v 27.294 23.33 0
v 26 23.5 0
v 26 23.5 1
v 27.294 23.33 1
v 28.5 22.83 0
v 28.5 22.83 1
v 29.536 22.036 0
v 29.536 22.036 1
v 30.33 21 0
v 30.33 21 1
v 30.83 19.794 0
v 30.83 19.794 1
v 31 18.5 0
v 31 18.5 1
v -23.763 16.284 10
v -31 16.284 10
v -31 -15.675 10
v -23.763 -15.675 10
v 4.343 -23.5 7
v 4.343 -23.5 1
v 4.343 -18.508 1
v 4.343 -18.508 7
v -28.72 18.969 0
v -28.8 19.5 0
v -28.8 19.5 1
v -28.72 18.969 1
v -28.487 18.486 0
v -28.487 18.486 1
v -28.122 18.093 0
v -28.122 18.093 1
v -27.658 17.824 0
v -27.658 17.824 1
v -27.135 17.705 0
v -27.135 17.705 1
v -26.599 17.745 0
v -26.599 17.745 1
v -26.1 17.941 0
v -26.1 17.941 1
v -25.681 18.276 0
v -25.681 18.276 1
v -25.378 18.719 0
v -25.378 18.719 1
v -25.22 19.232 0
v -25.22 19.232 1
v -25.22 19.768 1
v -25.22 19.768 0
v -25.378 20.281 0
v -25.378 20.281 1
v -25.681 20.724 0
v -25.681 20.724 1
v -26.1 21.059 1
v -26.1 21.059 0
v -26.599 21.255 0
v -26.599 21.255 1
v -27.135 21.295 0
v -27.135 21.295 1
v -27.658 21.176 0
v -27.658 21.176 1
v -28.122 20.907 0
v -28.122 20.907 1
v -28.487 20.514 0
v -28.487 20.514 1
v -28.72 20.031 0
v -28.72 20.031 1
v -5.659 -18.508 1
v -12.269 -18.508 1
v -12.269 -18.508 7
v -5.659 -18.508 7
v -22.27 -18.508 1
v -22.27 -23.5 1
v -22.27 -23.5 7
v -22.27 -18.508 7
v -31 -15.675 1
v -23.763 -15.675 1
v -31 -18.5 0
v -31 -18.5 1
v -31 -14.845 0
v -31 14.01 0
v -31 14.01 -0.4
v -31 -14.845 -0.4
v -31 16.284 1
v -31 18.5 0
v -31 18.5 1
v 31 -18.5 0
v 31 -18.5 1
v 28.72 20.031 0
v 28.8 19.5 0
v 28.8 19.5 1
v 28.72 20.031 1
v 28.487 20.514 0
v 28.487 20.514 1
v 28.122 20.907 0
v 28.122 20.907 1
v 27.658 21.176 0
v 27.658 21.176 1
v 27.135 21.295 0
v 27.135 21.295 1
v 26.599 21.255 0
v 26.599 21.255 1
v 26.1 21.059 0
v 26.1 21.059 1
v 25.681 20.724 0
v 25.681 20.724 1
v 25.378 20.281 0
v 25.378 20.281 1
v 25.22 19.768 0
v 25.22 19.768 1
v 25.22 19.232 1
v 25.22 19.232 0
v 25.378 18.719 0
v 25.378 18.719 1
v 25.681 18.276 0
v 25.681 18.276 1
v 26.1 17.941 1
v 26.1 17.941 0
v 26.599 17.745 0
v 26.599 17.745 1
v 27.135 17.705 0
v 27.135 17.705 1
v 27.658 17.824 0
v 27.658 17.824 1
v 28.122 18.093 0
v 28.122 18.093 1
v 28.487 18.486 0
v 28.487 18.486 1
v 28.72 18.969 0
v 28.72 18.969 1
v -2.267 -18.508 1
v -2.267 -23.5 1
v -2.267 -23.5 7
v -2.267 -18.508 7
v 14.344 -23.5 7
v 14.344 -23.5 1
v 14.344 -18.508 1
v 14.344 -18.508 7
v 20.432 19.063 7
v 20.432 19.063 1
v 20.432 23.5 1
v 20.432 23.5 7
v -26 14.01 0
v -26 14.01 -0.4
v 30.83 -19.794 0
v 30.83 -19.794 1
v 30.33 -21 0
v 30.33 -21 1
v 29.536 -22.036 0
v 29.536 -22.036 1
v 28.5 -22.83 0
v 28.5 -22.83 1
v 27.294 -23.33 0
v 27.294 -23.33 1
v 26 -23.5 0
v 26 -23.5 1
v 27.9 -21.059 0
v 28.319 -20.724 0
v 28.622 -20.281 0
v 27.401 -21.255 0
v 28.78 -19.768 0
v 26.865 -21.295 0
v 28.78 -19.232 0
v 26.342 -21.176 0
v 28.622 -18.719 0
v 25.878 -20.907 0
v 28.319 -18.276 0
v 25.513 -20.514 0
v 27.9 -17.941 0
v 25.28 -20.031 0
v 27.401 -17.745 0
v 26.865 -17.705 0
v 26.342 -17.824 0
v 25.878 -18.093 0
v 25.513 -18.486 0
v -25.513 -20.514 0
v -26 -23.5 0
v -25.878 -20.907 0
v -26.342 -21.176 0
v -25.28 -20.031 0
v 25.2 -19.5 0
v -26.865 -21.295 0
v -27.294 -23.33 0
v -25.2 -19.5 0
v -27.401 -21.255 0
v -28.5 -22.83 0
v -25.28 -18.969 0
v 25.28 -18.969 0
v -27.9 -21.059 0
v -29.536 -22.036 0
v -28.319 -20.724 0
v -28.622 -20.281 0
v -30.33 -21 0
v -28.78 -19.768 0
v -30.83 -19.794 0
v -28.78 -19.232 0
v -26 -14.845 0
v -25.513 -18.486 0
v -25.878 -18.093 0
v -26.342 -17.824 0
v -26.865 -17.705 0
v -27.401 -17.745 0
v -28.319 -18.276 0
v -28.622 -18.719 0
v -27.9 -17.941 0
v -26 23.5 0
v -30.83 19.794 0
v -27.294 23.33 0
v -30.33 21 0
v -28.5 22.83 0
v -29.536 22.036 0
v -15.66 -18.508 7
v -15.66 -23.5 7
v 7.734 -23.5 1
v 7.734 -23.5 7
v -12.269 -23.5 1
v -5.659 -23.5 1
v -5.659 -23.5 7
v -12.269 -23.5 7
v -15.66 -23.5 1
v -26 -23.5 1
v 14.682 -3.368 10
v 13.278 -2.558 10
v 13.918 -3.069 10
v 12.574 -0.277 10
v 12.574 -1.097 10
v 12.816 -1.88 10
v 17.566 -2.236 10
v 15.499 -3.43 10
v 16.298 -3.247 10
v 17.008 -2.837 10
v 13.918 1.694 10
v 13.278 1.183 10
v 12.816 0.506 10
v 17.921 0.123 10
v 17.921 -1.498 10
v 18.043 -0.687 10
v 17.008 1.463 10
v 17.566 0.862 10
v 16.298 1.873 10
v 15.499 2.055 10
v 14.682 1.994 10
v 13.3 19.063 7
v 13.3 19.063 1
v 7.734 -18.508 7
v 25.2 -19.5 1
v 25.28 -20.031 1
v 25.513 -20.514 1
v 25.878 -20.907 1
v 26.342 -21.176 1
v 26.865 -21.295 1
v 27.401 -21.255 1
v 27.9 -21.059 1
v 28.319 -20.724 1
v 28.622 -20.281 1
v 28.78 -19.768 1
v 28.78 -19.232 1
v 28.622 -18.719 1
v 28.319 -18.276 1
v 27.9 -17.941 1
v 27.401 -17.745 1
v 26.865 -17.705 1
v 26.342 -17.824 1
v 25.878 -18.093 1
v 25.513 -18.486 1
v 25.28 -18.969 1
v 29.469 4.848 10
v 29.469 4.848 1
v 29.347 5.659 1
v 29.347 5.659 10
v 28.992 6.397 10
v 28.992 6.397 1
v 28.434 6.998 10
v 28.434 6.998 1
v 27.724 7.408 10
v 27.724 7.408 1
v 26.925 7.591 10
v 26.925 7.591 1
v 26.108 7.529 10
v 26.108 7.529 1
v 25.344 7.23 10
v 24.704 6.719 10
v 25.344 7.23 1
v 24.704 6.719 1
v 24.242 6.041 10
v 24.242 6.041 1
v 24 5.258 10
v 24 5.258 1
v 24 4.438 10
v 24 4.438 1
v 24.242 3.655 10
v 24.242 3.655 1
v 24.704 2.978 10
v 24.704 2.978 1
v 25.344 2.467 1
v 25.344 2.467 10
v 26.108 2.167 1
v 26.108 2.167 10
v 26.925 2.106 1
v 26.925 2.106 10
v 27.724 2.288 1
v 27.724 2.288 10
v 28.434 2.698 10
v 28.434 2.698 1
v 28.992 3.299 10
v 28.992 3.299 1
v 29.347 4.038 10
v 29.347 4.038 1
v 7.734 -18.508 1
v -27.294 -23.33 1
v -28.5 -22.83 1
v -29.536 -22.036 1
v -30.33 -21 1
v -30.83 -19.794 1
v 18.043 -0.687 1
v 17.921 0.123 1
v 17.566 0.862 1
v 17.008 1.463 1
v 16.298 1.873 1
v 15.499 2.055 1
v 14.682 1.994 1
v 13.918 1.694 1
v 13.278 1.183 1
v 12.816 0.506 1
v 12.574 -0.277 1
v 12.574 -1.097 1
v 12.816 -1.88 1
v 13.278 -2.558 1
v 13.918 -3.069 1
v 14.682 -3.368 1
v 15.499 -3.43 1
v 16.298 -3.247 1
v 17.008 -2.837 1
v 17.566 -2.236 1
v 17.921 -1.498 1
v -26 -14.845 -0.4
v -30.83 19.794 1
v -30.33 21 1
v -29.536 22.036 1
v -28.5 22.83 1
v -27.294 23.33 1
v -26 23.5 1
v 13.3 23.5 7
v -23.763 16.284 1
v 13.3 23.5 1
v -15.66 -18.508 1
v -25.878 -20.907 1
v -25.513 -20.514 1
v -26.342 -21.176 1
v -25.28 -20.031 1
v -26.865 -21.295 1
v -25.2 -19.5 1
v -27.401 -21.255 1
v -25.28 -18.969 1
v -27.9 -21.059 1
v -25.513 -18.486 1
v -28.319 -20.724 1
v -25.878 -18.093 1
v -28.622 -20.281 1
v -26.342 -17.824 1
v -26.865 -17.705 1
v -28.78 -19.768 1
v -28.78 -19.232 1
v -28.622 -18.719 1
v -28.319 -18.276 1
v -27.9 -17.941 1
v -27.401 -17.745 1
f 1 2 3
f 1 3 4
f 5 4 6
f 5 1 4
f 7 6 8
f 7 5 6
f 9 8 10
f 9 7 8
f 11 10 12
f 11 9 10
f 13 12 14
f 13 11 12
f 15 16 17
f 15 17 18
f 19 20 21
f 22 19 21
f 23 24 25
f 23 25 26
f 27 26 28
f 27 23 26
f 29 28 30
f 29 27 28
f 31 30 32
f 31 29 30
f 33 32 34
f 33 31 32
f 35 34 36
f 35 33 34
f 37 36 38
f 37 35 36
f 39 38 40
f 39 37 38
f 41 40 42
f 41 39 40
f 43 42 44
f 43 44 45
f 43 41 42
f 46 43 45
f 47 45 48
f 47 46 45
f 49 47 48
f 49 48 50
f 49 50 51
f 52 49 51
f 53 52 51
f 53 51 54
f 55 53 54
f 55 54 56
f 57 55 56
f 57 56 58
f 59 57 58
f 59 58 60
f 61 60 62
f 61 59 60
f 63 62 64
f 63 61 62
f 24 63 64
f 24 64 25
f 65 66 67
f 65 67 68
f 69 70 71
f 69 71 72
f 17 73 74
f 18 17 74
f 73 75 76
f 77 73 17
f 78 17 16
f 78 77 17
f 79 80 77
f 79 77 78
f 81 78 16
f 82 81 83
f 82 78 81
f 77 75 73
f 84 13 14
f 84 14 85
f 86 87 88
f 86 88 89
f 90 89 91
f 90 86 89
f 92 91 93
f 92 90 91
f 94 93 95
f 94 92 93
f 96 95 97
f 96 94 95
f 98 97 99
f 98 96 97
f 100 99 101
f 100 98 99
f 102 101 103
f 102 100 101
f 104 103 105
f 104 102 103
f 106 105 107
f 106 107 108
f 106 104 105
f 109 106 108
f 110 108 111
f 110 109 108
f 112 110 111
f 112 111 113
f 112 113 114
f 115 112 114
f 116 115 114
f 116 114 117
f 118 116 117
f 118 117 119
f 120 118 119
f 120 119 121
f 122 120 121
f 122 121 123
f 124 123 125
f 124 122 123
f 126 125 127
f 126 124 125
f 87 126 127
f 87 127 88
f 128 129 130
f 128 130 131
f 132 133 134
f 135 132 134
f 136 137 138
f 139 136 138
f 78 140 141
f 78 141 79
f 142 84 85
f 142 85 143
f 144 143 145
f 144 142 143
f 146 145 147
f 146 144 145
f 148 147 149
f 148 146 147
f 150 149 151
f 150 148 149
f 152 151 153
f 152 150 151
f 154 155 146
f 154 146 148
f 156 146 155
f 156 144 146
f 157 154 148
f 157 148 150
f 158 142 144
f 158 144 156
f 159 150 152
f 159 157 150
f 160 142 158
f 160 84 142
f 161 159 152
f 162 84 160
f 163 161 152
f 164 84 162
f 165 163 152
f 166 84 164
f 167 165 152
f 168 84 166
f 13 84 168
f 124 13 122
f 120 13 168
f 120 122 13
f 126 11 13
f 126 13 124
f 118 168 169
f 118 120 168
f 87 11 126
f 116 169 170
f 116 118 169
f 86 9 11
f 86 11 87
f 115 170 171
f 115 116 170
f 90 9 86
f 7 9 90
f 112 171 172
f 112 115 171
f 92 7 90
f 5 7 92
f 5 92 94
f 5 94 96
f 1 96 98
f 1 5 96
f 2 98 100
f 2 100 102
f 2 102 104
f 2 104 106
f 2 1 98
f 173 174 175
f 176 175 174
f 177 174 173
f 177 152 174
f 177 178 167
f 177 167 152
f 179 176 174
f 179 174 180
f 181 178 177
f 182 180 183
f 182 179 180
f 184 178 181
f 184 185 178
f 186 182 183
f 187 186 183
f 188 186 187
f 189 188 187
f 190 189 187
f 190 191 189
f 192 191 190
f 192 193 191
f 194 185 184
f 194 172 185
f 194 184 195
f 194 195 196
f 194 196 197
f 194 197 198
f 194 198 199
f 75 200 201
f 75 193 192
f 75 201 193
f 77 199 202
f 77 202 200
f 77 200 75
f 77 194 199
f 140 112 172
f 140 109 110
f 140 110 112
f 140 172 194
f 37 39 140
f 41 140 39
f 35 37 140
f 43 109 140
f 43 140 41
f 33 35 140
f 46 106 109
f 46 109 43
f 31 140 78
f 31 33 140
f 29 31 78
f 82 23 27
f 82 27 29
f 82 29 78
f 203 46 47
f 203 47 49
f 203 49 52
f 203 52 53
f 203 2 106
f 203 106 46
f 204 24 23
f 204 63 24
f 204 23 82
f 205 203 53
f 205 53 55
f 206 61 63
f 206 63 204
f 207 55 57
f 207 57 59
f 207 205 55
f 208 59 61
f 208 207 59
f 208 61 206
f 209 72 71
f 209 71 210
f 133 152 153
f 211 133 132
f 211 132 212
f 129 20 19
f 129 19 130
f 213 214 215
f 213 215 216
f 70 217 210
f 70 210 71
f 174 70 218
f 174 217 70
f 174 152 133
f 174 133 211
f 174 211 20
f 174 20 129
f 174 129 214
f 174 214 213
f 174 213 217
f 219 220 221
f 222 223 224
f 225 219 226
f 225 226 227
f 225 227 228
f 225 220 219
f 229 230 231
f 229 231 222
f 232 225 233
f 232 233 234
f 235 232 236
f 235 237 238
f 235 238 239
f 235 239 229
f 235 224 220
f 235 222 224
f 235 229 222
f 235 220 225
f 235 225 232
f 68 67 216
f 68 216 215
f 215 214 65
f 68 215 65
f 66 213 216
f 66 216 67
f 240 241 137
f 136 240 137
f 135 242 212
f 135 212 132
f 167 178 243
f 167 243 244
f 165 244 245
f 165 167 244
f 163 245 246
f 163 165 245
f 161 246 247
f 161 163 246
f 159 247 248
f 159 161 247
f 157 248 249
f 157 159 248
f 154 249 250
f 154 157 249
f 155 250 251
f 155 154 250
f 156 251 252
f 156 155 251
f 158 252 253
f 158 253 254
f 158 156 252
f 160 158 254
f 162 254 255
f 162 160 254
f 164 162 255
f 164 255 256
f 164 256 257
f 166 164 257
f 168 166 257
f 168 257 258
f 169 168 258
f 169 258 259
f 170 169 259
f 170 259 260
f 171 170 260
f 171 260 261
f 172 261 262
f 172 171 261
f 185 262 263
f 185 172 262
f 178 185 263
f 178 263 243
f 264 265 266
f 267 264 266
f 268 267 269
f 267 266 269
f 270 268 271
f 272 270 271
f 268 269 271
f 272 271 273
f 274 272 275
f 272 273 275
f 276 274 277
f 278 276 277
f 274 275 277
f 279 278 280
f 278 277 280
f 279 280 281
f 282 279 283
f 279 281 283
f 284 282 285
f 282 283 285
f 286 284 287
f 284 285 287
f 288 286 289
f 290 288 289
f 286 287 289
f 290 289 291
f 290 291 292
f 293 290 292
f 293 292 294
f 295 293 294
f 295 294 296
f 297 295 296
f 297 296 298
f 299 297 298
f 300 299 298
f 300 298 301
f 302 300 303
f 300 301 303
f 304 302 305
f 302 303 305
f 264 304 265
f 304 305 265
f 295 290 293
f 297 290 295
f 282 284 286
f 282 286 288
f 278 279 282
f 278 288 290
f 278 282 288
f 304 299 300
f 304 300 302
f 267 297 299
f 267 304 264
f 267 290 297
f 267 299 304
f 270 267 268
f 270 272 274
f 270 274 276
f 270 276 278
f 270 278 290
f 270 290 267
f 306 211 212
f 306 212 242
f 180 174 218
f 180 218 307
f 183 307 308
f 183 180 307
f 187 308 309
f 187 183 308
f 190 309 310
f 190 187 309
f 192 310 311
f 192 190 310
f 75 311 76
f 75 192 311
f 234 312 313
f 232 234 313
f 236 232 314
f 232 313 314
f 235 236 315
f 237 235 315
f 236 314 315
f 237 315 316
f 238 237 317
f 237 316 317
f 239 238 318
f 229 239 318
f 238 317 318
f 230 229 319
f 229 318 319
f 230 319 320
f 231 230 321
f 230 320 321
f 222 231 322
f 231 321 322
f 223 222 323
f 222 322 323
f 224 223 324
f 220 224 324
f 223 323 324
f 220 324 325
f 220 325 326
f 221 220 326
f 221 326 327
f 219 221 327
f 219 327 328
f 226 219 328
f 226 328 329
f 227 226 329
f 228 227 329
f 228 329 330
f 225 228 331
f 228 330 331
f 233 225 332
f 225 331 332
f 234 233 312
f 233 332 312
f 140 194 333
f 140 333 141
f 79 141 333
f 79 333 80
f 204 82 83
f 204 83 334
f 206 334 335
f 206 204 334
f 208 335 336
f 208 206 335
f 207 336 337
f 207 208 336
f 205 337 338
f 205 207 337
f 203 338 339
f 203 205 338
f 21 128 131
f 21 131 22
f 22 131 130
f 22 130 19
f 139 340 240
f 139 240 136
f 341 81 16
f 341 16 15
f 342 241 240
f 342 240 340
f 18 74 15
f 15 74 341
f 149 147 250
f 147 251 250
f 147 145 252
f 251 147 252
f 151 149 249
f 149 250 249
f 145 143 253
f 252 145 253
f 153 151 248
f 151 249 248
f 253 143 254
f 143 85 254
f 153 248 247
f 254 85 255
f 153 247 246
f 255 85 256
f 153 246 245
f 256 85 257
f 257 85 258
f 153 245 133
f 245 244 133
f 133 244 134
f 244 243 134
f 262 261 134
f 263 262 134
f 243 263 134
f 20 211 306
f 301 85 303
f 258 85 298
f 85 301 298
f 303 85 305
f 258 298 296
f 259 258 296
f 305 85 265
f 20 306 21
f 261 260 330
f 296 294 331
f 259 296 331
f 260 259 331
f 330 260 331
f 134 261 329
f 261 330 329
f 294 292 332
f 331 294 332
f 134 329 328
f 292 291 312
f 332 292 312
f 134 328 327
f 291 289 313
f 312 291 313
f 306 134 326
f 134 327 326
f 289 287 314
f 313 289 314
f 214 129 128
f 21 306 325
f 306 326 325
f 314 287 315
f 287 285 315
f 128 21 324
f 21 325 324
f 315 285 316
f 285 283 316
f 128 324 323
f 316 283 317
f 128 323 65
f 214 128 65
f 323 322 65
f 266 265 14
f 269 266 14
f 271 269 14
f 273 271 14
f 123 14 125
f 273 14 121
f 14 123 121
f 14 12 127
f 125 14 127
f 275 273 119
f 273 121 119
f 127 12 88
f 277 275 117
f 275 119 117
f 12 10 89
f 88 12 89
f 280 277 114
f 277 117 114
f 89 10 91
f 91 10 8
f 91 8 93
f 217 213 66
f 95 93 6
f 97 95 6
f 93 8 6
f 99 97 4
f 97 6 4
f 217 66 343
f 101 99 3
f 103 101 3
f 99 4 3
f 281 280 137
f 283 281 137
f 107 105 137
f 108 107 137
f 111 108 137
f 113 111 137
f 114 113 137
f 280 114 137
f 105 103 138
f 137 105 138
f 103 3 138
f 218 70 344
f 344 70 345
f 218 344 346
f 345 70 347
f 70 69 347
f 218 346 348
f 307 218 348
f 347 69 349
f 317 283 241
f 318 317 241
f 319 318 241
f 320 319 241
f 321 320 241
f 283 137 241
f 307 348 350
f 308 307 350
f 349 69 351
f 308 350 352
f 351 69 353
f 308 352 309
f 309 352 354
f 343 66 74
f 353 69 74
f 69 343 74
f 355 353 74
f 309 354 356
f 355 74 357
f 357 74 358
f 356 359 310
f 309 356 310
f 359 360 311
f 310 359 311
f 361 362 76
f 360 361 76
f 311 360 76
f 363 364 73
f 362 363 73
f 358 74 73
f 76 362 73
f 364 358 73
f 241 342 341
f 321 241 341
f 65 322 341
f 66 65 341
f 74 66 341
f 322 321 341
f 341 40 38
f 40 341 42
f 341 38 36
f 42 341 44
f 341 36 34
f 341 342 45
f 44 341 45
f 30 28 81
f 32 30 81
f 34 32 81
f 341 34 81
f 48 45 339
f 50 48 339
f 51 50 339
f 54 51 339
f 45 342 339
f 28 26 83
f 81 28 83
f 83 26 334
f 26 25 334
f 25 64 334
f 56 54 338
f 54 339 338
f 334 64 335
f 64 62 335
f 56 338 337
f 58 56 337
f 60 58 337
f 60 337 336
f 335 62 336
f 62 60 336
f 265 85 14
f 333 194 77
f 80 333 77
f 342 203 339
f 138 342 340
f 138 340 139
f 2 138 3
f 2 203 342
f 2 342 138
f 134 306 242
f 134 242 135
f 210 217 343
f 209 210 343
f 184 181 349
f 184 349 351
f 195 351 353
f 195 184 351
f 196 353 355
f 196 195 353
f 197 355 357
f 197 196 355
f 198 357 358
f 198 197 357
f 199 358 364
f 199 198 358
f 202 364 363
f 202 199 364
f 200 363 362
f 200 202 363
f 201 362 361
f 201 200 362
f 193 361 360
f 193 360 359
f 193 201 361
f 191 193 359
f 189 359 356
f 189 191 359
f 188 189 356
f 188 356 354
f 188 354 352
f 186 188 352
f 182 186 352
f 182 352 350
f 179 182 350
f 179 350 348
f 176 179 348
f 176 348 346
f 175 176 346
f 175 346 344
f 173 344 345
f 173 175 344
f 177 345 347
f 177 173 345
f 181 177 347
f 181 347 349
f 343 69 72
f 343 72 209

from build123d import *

# Parameters (mm, degrees)
SKETCH_2_R      = 1.8
EXTRUDE_1_DEPTH = 1
SKETCH_4_W      = 7.237291628
SKETCH_4_H      = 31.958994792
EXTRUDE_2_DEPTH = 9
SKETCH_5_W      = 6.609648953
SKETCH_5_H      = 4.992409467
SKETCH_5_W_2    = 7.131463344
SKETCH_5_H_2    = 4.436954379
EXTRUDE_3_DEPTH = 6
SKETCH_6_R      = 2.75
EXTRUDE_4_DEPTH = 9
SKETCH_7_W      = 5
SKETCH_7_H      = 28.854406725
EXTRUDE_5_DEPTH = 0.4


with BuildPart() as part:
    # 草图2 → 凸台-拉伸1 (new body)
    with BuildSketch(Plane.XY):
        with BuildLine():
            Line((-26, 23.5), (26, 23.5))
            ThreePointArc((26, 23.5), (29.535533906, 22.035533906), (31, 18.5))
            Line((31, 18.5), (31, -18.5))
            ThreePointArc((31, -18.5), (29.535533906, -22.035533906), (26, -23.5))
            Line((26, -23.5), (-26, -23.5))
            ThreePointArc((-26, -23.5), (-29.535533906, -22.035533906), (-31, -18.5))
            Line((-31, -18.5), (-31, 18.5))
            ThreePointArc((-31, 18.5), (-29.535533906, 22.035533906), (-26, 23.5))
        make_face()
        with Locations((27, 19.5)):
            Circle(SKETCH_2_R, mode=Mode.SUBTRACT)
        with Locations(Location((-27, 19.5, 0), (0, 0, 180))):
            Circle(SKETCH_2_R, mode=Mode.SUBTRACT)
        with Locations(Location((27, -19.5, 0), (0, 0, 180))):
            Circle(SKETCH_2_R, mode=Mode.SUBTRACT)
        with Locations((-27, -19.5)):
            Circle(SKETCH_2_R, mode=Mode.SUBTRACT)
    extrude(amount=EXTRUDE_1_DEPTH)

    # 草图4 → 凸台-拉伸2 (add)
    with BuildSketch(Plane.XY.offset(1)):
        with Locations((-27.381354186, 0.304371379)):
            Rectangle(SKETCH_4_W, SKETCH_4_H)
    extrude(amount=EXTRUDE_2_DEPTH)

    # 草图5 → 凸台-拉伸3 (add)
    with BuildSketch(Plane.XY.offset(1)):
        with Locations((-18.965120236, -21.003795266)):
            Rectangle(SKETCH_5_W, SKETCH_5_H)
        with Locations((-8.96367774, -21.003795266)):
            Rectangle(SKETCH_5_W, SKETCH_5_H)
        with Locations((1.037764754, -21.003795266)):
            Rectangle(SKETCH_5_W, SKETCH_5_H)
        with Locations((11.039207249, -21.003795266)):
            Rectangle(SKETCH_5_W, SKETCH_5_H)
        with Locations((16.866134615, 21.281522811)):
            Rectangle(SKETCH_5_W_2, SKETCH_5_H_2)
    extrude(amount=EXTRUDE_3_DEPTH)

    # 草图6 → 凸台-拉伸4 (add)
    with BuildSketch(Plane.XY.offset(1)):
        with Locations((26.719458911, 4.848201251)):
            Circle(SKETCH_6_R)
        with Locations((15.293444682, -0.687190124)):
            Circle(SKETCH_6_R)
    extrude(amount=EXTRUDE_4_DEPTH)

    # 草图7 → 凸台-拉伸5 (add)
    with BuildSketch(Plane(origin=(0, 0, 0), x_dir=(-1, 0, 0), z_dir=(0, 0, -1))):
        with Locations((28.5, -0.417423606)):
            Rectangle(SKETCH_7_W, SKETCH_7_H)
    extrude(amount=EXTRUDE_5_DEPTH)


solid = part.part
